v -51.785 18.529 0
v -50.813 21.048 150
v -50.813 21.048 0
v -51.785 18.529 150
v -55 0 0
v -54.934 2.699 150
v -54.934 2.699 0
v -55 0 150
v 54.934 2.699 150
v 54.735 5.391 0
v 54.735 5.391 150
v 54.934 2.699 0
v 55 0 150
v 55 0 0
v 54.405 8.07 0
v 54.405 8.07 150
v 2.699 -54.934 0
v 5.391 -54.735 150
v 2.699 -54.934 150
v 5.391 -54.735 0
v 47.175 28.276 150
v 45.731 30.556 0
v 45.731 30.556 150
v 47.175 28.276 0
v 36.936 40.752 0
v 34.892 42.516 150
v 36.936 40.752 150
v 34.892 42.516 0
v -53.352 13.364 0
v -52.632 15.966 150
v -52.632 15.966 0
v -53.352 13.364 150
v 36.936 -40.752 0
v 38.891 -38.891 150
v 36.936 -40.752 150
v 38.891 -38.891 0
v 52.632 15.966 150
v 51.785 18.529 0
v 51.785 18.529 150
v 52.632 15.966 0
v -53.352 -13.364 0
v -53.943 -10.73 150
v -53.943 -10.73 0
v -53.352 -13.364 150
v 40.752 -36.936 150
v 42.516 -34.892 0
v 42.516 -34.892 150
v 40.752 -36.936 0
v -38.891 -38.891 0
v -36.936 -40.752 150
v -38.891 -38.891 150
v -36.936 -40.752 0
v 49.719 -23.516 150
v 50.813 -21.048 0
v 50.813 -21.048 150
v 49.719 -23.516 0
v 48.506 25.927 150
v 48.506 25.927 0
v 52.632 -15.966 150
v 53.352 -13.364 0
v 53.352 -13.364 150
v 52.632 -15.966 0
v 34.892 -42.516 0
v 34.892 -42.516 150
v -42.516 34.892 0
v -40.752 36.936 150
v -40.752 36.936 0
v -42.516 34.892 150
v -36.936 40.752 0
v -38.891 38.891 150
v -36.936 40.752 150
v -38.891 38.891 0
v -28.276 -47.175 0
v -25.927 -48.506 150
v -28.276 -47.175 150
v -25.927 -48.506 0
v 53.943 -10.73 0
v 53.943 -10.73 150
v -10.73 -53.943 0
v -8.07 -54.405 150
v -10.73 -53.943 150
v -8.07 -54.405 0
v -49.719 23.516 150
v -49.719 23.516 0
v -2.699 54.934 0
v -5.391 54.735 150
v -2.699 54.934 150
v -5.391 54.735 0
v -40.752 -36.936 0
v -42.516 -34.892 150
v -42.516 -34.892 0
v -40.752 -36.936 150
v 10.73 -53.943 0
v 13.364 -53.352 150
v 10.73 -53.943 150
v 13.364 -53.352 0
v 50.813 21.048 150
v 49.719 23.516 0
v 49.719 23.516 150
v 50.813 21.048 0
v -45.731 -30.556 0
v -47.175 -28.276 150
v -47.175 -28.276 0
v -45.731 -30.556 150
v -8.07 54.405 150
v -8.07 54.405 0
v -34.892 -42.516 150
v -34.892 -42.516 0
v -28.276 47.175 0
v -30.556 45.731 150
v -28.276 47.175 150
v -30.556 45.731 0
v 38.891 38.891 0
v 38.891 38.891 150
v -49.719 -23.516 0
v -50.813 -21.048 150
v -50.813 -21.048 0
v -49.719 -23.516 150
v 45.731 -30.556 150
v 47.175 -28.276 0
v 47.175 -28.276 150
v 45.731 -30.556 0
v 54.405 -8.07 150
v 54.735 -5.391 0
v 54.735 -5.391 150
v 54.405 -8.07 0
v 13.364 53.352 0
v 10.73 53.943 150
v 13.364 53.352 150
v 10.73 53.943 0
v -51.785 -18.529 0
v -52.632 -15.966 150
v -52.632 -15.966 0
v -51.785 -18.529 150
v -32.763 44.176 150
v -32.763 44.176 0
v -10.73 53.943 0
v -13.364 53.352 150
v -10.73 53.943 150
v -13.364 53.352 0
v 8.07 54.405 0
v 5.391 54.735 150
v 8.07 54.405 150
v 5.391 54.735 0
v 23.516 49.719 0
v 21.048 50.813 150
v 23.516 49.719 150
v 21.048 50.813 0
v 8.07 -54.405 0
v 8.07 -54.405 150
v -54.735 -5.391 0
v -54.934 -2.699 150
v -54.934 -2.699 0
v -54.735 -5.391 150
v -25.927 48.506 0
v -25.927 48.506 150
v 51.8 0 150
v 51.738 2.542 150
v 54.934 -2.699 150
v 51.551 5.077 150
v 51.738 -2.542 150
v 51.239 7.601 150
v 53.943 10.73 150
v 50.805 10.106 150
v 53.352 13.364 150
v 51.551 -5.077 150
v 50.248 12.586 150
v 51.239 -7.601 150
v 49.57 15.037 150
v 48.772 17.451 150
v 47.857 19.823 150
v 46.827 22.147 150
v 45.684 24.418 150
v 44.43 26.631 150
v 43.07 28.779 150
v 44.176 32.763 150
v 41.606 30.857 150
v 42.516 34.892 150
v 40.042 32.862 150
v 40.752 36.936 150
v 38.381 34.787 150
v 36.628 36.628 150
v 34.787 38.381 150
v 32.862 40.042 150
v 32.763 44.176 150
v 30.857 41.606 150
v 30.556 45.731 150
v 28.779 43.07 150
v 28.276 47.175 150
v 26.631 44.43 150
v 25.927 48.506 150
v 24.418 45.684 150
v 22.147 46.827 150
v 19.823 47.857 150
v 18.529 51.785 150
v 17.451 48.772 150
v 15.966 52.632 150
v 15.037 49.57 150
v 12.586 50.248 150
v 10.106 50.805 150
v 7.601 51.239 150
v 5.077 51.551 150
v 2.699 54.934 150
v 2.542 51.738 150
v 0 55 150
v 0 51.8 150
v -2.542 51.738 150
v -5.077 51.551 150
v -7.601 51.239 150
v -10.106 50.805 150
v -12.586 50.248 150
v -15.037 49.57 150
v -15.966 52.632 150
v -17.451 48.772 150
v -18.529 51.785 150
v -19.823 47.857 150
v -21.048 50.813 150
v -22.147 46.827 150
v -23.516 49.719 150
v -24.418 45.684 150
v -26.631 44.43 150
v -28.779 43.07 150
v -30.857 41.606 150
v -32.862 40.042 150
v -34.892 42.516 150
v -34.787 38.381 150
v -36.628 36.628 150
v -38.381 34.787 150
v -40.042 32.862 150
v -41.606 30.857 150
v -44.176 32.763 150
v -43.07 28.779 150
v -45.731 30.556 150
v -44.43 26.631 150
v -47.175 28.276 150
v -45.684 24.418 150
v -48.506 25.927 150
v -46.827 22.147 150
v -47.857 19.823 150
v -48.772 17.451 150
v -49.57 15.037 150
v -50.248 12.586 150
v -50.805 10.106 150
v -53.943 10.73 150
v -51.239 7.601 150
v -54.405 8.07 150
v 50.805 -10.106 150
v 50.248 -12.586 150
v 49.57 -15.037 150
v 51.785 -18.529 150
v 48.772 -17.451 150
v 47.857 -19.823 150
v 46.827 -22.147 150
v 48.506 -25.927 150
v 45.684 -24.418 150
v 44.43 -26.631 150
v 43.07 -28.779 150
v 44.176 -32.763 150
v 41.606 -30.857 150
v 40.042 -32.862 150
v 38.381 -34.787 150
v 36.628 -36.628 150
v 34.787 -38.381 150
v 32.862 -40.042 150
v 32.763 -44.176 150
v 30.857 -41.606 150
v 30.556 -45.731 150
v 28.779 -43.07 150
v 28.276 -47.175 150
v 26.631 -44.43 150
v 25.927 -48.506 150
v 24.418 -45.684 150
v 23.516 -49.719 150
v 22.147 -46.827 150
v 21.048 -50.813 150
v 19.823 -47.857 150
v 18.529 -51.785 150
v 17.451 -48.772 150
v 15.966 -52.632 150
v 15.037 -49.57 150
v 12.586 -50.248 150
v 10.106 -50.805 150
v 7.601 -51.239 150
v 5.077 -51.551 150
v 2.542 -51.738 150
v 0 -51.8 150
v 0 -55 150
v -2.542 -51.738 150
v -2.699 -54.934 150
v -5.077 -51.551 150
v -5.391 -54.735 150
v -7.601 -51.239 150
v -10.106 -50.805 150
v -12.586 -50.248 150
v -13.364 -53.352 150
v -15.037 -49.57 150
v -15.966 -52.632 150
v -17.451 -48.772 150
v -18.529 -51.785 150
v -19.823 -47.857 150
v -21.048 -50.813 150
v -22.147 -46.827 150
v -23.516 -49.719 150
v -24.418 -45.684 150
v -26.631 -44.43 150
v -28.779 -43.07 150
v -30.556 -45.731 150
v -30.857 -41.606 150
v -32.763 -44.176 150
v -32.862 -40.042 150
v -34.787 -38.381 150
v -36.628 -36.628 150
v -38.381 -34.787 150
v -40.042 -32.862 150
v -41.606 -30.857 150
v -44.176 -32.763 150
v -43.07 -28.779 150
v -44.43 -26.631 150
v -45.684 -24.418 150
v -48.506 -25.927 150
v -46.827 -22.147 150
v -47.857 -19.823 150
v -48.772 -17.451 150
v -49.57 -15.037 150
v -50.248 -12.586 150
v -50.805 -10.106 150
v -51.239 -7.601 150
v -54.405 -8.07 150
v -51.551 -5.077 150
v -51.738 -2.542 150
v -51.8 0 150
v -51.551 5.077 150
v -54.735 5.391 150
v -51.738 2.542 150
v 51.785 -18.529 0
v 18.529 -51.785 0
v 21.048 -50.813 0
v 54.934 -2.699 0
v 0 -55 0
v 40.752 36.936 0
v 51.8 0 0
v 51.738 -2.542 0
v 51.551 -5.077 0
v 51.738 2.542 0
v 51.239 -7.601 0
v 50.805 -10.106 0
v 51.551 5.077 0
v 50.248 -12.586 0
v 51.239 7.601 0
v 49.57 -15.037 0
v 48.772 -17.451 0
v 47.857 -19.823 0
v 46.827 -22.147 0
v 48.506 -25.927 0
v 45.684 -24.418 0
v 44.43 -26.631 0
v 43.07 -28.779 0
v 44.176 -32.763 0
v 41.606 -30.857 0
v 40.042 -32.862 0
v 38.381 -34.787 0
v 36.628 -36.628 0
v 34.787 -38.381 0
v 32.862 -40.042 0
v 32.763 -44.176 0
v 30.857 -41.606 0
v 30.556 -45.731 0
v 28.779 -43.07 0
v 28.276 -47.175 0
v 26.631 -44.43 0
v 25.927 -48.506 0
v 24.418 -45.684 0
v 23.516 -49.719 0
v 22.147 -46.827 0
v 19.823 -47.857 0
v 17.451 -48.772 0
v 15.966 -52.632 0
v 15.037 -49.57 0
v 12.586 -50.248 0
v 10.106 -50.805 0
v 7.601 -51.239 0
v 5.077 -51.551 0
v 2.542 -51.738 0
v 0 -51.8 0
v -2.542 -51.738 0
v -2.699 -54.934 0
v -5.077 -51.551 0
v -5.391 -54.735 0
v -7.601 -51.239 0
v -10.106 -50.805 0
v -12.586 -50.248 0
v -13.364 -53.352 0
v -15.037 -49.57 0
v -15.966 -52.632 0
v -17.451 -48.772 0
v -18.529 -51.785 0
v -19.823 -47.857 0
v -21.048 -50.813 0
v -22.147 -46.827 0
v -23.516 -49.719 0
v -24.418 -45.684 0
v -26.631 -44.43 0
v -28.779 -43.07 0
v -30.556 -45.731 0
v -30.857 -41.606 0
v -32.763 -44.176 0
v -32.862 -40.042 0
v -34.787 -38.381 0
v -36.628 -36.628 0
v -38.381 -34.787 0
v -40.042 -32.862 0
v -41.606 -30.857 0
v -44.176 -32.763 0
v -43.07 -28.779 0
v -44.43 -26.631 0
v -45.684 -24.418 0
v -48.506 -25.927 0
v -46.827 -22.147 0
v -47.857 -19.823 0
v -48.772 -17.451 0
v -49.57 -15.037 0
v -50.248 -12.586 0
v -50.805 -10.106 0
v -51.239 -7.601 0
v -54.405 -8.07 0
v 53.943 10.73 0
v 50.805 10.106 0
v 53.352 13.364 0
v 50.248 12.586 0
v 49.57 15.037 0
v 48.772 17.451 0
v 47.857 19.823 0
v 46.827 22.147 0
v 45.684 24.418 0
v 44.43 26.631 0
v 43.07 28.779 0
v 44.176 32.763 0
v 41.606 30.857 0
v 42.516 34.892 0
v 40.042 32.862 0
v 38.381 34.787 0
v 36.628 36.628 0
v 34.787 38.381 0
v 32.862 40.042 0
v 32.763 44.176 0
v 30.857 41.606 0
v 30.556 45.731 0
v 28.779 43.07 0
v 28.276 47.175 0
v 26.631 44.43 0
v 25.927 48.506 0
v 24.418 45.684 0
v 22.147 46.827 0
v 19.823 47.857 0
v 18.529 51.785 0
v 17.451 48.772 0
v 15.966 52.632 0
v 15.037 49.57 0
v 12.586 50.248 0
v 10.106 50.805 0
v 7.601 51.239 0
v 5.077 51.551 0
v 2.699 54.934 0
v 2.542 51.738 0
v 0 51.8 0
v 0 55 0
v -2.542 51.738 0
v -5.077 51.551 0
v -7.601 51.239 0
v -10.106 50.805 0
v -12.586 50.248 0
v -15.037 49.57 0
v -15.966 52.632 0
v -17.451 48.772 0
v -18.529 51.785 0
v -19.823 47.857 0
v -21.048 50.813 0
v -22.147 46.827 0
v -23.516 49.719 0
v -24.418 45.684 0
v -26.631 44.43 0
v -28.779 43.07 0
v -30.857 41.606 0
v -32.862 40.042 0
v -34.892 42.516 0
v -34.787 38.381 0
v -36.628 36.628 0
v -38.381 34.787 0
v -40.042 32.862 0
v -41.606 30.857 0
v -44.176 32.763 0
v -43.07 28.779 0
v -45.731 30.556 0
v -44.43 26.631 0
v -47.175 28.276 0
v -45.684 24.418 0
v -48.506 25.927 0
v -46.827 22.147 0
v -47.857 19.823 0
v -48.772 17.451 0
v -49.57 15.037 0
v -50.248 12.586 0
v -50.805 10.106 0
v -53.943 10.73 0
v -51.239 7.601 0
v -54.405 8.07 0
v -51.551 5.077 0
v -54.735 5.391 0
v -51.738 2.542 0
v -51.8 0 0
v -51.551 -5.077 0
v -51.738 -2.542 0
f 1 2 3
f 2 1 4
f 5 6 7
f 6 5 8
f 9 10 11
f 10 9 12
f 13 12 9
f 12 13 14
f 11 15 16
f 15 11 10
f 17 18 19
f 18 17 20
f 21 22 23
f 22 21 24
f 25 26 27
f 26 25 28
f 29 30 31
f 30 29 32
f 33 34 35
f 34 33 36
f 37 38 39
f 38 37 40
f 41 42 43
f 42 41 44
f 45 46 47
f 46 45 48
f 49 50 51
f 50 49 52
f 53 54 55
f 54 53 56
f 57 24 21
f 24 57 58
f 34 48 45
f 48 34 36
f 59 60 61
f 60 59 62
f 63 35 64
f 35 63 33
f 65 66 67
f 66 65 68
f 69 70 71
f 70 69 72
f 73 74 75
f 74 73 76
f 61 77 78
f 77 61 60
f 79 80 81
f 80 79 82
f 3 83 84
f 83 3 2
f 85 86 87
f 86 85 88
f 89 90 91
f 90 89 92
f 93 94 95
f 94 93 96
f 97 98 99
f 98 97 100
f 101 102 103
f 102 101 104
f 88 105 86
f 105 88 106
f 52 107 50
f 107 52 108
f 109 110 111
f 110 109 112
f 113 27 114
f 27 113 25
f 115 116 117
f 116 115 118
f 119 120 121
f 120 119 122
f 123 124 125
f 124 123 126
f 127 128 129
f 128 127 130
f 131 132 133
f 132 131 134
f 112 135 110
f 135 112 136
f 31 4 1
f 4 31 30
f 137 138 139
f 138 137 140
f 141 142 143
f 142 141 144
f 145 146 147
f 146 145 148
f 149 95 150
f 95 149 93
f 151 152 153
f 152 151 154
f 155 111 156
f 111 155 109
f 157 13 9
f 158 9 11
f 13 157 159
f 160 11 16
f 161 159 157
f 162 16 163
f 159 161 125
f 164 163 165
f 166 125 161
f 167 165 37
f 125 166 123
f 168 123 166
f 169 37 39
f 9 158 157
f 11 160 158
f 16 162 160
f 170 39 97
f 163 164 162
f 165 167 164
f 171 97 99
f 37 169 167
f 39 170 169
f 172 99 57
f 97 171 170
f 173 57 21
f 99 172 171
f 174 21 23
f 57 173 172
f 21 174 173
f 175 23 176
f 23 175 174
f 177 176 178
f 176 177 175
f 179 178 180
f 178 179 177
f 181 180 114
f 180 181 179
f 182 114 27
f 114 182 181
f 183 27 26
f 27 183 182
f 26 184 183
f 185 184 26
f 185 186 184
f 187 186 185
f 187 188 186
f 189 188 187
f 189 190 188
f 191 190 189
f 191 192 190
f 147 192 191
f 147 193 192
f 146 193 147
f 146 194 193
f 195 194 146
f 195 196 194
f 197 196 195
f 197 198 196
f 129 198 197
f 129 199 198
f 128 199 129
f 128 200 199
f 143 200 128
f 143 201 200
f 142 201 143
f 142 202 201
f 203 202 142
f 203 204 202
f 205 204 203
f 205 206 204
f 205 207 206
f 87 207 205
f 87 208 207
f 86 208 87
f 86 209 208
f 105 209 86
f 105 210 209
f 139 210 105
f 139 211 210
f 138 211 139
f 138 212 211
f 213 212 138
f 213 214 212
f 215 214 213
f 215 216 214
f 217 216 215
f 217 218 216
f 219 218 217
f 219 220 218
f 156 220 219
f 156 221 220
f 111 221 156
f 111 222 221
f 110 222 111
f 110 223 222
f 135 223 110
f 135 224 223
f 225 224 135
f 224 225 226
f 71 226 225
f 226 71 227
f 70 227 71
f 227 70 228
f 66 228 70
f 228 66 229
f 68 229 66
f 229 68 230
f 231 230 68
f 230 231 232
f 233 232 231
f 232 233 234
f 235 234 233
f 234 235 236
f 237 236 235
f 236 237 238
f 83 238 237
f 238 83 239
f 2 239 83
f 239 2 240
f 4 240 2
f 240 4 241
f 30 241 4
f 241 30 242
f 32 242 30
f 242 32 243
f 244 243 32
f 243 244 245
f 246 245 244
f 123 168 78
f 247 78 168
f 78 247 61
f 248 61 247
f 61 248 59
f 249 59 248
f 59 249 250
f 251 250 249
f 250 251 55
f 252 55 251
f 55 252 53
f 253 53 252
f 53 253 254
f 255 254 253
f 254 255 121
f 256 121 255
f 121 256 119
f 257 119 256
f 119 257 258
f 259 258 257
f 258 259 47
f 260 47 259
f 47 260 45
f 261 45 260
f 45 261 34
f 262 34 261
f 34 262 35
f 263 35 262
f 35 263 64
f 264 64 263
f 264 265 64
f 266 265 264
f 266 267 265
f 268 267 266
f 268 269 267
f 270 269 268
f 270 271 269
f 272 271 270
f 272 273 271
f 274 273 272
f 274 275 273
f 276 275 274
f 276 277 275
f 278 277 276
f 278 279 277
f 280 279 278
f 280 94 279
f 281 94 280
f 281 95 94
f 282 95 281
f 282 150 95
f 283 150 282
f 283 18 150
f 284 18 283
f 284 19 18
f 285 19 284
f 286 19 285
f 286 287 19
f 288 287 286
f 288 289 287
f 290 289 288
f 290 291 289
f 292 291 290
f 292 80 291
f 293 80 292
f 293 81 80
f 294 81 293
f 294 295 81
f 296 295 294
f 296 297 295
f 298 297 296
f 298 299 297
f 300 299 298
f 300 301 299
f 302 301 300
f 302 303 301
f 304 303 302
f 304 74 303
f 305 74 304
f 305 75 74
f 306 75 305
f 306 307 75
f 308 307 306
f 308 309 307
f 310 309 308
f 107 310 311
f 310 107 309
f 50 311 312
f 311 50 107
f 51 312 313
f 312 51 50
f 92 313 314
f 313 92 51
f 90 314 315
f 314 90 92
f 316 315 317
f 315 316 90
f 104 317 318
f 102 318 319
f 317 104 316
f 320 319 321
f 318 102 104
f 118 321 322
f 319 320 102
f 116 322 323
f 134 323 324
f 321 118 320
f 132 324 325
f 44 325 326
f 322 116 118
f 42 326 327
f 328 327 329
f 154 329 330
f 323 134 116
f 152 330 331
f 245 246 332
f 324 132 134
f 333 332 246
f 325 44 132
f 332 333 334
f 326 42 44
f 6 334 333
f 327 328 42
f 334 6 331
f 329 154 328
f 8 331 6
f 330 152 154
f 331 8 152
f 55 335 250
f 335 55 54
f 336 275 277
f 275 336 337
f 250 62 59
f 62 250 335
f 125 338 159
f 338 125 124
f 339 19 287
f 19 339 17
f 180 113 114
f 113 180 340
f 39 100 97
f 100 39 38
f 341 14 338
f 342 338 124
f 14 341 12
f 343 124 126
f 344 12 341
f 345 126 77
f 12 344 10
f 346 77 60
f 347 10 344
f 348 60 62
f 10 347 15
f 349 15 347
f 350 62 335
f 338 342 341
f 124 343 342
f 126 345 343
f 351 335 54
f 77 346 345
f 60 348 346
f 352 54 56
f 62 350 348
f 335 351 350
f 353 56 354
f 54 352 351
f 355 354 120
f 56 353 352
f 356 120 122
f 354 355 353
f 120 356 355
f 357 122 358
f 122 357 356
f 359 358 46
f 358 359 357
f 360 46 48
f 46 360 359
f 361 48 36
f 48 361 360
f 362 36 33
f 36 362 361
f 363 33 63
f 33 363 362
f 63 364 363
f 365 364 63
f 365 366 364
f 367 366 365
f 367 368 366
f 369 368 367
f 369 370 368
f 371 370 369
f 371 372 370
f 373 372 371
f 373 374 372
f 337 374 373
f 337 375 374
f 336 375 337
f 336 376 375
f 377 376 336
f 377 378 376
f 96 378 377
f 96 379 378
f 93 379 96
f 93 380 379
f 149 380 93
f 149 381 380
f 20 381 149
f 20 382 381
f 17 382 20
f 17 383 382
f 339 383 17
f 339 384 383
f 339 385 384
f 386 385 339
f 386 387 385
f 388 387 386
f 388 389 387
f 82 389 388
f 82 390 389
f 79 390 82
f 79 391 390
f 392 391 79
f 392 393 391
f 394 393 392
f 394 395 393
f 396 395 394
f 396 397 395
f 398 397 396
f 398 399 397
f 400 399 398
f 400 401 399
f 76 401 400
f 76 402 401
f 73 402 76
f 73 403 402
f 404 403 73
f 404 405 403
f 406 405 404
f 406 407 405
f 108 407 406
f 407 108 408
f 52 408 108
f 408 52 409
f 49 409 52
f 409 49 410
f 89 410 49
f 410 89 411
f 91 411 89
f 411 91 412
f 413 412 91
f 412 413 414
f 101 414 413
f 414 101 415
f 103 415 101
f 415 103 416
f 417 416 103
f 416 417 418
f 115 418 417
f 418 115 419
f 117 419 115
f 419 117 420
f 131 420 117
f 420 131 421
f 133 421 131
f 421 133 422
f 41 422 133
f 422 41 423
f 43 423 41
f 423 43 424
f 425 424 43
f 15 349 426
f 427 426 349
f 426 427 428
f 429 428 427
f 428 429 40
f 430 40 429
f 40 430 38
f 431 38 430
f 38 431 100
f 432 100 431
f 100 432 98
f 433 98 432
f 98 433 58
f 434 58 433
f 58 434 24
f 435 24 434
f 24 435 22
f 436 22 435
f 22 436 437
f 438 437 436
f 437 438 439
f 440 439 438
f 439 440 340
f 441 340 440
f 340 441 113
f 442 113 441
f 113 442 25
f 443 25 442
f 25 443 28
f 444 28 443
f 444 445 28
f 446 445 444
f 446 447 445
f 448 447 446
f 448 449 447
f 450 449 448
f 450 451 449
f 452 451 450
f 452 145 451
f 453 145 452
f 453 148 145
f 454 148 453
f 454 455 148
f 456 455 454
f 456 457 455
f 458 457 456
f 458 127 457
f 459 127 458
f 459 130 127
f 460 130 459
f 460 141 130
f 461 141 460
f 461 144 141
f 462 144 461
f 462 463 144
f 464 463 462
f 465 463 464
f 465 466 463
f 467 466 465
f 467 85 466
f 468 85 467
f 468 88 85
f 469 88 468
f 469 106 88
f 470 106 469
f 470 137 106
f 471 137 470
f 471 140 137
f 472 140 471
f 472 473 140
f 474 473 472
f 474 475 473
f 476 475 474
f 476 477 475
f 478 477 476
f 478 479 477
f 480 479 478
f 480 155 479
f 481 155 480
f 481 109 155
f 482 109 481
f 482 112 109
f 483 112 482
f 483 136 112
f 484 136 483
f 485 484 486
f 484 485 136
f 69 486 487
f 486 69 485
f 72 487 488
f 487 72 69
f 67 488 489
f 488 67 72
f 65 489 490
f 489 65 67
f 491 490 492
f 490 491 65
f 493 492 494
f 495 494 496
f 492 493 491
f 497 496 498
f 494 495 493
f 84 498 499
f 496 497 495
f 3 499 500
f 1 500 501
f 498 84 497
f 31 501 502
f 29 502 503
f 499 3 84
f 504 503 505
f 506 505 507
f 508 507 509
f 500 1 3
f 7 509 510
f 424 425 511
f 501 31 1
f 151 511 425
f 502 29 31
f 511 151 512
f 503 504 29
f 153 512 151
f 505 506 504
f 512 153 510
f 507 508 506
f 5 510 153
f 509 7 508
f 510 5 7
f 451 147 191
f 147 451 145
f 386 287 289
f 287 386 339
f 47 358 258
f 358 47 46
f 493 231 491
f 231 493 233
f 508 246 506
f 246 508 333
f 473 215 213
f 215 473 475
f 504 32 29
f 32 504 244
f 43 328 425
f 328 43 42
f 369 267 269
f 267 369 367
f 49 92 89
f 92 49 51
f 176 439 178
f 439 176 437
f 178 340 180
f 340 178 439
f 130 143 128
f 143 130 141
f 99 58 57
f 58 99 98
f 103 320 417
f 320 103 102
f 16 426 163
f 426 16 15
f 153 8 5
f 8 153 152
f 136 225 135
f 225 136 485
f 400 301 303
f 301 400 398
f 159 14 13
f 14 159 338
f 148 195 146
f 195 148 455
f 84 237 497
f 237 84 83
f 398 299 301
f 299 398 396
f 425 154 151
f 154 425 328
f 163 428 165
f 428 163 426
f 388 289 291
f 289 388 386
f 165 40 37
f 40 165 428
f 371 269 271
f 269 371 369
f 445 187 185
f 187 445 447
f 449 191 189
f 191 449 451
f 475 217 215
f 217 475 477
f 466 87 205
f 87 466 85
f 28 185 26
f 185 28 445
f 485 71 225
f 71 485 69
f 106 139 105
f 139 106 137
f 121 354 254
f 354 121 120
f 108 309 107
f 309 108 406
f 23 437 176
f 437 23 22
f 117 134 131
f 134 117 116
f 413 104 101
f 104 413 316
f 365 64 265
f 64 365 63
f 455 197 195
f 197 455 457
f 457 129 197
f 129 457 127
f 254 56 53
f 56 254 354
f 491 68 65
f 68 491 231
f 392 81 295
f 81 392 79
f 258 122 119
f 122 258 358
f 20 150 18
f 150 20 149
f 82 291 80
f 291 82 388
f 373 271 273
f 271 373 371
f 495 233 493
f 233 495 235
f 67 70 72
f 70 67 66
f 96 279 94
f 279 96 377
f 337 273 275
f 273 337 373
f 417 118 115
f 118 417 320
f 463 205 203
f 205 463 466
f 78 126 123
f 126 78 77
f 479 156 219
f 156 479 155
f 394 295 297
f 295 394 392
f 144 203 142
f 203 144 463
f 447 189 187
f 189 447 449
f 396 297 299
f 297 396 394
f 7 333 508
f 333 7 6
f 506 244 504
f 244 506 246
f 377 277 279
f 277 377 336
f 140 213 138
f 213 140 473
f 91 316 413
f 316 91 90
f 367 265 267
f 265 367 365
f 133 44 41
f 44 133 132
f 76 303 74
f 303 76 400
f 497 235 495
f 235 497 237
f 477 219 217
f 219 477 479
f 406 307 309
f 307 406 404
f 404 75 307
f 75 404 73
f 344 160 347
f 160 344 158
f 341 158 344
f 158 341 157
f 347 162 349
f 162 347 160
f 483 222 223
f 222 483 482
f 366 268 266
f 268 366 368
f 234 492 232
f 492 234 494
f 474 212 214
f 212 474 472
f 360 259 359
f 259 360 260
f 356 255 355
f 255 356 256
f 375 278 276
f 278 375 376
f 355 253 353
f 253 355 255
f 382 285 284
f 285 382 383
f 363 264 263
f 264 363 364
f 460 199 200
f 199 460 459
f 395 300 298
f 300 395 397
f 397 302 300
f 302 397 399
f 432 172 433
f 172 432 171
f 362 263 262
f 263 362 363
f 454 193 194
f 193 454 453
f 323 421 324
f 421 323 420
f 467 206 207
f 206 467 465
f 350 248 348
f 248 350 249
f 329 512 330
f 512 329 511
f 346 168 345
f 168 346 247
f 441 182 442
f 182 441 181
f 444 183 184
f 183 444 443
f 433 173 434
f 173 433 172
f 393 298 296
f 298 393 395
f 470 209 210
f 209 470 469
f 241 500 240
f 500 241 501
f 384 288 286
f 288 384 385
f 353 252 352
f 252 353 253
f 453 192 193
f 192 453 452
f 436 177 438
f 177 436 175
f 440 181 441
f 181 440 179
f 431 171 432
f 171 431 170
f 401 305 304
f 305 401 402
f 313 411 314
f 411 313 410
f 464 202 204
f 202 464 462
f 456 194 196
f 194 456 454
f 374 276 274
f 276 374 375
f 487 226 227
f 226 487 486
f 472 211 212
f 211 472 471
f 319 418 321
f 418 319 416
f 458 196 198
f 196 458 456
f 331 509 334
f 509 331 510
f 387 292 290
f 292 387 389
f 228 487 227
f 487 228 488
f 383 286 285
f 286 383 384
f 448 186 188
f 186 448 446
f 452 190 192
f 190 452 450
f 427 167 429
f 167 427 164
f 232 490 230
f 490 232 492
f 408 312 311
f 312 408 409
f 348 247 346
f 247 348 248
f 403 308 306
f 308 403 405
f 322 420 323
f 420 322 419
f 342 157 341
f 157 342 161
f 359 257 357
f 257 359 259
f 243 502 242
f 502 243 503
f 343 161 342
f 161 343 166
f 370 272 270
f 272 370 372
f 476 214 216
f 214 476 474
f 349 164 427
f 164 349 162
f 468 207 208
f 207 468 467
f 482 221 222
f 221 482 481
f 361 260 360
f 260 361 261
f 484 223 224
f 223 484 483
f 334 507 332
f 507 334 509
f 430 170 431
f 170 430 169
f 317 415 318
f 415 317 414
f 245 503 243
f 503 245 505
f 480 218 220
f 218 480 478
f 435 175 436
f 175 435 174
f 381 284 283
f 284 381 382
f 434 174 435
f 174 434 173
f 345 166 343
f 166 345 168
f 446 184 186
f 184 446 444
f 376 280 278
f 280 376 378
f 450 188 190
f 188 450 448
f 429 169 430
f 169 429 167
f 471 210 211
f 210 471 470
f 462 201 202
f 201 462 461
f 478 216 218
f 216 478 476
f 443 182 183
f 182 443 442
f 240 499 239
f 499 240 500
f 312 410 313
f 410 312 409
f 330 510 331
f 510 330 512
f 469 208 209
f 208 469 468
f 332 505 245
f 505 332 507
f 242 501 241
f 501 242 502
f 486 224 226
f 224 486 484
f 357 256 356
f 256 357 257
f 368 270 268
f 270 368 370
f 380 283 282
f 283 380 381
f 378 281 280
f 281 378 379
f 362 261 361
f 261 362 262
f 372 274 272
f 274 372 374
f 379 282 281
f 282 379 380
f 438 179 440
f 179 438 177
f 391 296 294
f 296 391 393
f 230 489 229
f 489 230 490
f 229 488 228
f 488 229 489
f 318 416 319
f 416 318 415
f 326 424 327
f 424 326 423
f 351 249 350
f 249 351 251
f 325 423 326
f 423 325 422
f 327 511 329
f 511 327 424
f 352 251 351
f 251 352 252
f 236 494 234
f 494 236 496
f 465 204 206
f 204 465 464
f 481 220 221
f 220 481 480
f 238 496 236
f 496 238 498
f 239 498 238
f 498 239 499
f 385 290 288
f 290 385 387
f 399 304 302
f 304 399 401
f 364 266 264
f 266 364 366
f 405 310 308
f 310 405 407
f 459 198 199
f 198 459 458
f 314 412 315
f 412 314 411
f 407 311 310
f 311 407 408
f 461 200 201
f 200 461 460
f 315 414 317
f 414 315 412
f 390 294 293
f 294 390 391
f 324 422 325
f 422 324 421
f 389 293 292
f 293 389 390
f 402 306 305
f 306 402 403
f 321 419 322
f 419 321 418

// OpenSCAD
$fn = 128;

// HT 110 pipe (approx): OD 110 mm, wall 3.2 mm, length 150 mm
od = 110;
wall = 3.2;
len = 150;

id = od - 2*wall;

difference() {
  cylinder(h = len, d = od);
  translate([0,0,-0.1])
    cylinder(h = len + 0.2, d = id);
}
